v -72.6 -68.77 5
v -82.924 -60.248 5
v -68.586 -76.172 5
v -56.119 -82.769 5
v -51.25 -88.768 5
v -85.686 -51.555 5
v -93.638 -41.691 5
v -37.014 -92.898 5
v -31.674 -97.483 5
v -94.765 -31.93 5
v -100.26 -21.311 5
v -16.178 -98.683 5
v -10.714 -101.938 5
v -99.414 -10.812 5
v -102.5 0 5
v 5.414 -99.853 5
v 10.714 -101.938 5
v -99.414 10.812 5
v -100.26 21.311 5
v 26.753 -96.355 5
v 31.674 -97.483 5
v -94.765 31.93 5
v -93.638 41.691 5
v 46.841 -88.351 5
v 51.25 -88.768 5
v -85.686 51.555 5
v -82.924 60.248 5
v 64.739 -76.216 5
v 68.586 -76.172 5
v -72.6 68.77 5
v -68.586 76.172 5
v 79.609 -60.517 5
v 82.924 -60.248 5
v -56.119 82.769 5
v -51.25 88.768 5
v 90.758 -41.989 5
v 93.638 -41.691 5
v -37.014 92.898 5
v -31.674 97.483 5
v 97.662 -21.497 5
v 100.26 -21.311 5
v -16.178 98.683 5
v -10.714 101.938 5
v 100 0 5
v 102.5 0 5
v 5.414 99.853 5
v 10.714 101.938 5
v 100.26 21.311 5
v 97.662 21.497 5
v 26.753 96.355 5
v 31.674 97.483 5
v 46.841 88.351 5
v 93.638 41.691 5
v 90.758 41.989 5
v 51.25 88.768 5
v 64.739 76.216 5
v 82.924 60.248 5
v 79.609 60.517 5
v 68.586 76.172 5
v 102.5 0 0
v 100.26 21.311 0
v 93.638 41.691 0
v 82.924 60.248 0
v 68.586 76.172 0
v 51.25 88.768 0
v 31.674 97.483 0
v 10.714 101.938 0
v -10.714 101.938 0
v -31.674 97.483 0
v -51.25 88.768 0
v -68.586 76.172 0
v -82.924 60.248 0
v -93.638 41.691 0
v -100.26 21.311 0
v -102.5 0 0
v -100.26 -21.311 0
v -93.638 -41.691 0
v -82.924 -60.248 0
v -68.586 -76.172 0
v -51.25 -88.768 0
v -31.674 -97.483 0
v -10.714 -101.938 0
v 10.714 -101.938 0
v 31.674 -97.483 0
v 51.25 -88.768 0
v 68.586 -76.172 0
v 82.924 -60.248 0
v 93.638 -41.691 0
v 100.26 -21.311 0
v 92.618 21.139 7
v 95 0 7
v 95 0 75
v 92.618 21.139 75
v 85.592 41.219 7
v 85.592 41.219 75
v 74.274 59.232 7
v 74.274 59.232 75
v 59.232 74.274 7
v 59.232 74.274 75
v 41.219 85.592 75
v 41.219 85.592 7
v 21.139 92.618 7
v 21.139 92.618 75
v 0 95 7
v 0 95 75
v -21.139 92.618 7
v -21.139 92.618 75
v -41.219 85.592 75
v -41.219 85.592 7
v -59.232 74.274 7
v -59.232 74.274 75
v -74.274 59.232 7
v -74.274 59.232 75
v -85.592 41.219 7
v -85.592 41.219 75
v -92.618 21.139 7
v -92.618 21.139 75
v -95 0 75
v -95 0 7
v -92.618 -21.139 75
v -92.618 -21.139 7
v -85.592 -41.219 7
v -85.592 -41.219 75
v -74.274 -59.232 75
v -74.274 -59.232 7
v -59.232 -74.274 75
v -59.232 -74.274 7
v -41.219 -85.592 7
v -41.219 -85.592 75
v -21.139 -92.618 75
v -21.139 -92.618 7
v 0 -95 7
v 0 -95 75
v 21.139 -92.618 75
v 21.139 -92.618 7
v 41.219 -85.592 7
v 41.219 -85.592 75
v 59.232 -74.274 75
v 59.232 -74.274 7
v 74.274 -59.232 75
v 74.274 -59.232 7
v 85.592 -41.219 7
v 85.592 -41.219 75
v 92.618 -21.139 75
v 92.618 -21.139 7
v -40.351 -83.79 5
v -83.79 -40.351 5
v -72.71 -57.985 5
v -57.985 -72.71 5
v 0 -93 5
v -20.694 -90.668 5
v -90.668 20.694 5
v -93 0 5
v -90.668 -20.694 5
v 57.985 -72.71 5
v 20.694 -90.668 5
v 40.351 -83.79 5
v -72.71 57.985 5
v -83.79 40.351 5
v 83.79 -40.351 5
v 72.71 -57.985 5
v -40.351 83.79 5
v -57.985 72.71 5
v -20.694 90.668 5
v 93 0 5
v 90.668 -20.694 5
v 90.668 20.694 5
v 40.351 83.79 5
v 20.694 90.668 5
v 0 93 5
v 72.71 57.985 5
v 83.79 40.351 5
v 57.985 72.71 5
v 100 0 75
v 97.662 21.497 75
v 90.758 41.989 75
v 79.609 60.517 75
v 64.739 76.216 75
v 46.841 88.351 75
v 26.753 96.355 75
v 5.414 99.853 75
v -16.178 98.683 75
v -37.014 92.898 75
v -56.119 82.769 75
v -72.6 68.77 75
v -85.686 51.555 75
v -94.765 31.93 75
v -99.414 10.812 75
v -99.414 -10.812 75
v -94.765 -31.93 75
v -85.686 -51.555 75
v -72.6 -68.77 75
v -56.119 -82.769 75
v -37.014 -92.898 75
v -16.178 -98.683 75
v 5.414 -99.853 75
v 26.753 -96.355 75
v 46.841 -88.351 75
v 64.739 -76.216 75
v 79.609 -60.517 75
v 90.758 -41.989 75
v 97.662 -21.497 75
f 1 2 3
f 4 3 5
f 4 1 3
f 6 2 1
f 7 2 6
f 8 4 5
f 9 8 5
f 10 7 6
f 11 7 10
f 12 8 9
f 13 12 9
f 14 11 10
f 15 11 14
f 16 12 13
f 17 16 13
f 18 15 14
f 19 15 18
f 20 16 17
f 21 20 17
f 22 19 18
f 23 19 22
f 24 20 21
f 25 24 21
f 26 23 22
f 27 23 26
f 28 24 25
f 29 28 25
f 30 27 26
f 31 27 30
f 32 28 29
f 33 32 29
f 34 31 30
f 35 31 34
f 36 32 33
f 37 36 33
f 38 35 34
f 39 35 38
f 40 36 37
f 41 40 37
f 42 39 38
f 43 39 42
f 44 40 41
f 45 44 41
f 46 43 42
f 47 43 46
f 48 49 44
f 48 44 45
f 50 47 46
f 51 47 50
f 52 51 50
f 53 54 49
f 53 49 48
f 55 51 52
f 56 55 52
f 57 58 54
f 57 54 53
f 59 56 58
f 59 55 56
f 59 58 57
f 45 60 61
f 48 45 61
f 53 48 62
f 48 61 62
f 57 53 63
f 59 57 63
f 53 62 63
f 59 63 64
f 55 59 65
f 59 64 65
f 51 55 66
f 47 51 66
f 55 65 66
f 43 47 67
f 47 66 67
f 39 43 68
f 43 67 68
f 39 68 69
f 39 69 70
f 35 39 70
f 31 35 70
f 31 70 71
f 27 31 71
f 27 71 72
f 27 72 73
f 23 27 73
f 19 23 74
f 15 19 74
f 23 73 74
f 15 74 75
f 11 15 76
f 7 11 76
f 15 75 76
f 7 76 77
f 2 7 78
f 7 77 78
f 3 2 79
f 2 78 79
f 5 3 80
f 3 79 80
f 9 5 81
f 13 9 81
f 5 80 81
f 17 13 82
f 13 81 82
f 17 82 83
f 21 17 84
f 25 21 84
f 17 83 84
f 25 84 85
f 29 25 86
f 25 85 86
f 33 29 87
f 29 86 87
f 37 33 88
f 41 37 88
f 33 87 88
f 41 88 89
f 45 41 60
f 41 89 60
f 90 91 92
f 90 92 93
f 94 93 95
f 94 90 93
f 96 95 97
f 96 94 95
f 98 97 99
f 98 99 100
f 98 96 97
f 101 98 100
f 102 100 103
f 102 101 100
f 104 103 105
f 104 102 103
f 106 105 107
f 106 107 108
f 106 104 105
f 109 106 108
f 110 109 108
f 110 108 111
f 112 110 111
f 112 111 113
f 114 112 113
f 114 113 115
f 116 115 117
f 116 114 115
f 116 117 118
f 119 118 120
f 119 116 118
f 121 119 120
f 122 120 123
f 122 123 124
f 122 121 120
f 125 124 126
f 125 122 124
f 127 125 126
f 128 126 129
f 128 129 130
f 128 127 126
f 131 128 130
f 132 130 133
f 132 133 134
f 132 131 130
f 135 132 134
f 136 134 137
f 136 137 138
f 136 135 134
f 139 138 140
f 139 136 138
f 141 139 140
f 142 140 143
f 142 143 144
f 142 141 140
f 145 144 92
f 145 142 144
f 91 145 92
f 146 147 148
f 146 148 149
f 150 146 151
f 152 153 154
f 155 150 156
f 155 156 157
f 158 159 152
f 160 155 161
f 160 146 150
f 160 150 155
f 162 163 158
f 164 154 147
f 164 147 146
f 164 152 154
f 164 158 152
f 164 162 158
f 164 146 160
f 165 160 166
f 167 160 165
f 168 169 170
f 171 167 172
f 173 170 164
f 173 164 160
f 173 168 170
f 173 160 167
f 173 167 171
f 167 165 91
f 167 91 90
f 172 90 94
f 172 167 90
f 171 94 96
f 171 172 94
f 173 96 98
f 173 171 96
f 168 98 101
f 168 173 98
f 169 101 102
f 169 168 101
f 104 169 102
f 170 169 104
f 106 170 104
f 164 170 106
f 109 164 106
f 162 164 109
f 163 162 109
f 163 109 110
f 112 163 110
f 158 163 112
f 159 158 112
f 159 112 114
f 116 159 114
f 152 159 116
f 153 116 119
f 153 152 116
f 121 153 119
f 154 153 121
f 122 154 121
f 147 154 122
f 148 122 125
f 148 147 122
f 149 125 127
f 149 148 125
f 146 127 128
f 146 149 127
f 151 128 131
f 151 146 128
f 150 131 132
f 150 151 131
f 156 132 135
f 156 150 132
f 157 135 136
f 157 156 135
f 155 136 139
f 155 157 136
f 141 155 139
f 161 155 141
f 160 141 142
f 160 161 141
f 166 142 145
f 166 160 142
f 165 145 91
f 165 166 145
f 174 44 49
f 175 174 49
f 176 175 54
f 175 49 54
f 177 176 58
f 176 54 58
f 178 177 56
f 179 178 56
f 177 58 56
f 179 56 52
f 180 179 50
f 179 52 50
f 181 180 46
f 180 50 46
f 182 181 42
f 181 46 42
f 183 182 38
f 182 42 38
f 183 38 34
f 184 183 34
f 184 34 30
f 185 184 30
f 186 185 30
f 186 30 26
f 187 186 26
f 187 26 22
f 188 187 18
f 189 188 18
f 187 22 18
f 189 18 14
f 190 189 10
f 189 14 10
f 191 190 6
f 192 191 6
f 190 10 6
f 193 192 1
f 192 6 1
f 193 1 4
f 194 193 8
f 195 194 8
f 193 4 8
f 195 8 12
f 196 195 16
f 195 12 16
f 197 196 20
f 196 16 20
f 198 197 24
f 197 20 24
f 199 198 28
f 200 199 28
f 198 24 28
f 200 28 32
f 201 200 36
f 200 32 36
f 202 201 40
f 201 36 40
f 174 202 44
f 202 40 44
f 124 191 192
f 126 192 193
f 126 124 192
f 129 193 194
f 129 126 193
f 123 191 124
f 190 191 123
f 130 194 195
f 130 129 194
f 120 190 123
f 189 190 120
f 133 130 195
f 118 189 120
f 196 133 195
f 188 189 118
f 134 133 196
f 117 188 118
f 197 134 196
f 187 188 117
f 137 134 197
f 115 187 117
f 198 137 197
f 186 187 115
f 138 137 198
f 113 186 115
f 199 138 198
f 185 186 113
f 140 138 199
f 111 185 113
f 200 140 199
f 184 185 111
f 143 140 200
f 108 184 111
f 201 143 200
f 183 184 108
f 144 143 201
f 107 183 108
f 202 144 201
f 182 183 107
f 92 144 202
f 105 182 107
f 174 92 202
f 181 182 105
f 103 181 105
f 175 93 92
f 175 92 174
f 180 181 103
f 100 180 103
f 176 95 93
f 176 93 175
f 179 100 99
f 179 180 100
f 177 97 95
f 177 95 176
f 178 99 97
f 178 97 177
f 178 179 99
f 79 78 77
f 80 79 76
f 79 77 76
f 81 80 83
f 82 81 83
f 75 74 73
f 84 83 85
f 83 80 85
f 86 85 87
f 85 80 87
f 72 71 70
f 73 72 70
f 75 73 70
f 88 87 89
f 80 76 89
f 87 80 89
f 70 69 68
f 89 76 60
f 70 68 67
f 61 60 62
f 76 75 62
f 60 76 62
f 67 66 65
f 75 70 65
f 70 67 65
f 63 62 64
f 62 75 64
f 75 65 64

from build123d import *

# Parameters (mm, degrees)
SKETCH_R      = 102.5
PAD_DEPTH     = 5
SKETCH001_R   = 100
SKETCH001_R_2 = 95
PAD001_DEPTH  = 70
CHAMFER_SIZE  = 2


with BuildPart() as part:
    # Sketch → Pad (new body)
    with BuildSketch(Plane.XY):
        Circle(SKETCH_R)
    extrude(amount=PAD_DEPTH)

    # Sketch001 (on DatumPlane) → Pad001 (join)
    with BuildSketch(Plane.XY.offset(5)):
        Circle(SKETCH001_R)
        Circle(SKETCH001_R_2, mode=Mode.SUBTRACT)
    extrude(amount=PAD001_DEPTH)

    # Chamfer
    chamfer_edges = [part.edges().sort_by_distance(p)[0] for p in [
        (-95, 0, 5),
    ]]
    chamfer(chamfer_edges, length=CHAMFER_SIZE)


solid = part.part
